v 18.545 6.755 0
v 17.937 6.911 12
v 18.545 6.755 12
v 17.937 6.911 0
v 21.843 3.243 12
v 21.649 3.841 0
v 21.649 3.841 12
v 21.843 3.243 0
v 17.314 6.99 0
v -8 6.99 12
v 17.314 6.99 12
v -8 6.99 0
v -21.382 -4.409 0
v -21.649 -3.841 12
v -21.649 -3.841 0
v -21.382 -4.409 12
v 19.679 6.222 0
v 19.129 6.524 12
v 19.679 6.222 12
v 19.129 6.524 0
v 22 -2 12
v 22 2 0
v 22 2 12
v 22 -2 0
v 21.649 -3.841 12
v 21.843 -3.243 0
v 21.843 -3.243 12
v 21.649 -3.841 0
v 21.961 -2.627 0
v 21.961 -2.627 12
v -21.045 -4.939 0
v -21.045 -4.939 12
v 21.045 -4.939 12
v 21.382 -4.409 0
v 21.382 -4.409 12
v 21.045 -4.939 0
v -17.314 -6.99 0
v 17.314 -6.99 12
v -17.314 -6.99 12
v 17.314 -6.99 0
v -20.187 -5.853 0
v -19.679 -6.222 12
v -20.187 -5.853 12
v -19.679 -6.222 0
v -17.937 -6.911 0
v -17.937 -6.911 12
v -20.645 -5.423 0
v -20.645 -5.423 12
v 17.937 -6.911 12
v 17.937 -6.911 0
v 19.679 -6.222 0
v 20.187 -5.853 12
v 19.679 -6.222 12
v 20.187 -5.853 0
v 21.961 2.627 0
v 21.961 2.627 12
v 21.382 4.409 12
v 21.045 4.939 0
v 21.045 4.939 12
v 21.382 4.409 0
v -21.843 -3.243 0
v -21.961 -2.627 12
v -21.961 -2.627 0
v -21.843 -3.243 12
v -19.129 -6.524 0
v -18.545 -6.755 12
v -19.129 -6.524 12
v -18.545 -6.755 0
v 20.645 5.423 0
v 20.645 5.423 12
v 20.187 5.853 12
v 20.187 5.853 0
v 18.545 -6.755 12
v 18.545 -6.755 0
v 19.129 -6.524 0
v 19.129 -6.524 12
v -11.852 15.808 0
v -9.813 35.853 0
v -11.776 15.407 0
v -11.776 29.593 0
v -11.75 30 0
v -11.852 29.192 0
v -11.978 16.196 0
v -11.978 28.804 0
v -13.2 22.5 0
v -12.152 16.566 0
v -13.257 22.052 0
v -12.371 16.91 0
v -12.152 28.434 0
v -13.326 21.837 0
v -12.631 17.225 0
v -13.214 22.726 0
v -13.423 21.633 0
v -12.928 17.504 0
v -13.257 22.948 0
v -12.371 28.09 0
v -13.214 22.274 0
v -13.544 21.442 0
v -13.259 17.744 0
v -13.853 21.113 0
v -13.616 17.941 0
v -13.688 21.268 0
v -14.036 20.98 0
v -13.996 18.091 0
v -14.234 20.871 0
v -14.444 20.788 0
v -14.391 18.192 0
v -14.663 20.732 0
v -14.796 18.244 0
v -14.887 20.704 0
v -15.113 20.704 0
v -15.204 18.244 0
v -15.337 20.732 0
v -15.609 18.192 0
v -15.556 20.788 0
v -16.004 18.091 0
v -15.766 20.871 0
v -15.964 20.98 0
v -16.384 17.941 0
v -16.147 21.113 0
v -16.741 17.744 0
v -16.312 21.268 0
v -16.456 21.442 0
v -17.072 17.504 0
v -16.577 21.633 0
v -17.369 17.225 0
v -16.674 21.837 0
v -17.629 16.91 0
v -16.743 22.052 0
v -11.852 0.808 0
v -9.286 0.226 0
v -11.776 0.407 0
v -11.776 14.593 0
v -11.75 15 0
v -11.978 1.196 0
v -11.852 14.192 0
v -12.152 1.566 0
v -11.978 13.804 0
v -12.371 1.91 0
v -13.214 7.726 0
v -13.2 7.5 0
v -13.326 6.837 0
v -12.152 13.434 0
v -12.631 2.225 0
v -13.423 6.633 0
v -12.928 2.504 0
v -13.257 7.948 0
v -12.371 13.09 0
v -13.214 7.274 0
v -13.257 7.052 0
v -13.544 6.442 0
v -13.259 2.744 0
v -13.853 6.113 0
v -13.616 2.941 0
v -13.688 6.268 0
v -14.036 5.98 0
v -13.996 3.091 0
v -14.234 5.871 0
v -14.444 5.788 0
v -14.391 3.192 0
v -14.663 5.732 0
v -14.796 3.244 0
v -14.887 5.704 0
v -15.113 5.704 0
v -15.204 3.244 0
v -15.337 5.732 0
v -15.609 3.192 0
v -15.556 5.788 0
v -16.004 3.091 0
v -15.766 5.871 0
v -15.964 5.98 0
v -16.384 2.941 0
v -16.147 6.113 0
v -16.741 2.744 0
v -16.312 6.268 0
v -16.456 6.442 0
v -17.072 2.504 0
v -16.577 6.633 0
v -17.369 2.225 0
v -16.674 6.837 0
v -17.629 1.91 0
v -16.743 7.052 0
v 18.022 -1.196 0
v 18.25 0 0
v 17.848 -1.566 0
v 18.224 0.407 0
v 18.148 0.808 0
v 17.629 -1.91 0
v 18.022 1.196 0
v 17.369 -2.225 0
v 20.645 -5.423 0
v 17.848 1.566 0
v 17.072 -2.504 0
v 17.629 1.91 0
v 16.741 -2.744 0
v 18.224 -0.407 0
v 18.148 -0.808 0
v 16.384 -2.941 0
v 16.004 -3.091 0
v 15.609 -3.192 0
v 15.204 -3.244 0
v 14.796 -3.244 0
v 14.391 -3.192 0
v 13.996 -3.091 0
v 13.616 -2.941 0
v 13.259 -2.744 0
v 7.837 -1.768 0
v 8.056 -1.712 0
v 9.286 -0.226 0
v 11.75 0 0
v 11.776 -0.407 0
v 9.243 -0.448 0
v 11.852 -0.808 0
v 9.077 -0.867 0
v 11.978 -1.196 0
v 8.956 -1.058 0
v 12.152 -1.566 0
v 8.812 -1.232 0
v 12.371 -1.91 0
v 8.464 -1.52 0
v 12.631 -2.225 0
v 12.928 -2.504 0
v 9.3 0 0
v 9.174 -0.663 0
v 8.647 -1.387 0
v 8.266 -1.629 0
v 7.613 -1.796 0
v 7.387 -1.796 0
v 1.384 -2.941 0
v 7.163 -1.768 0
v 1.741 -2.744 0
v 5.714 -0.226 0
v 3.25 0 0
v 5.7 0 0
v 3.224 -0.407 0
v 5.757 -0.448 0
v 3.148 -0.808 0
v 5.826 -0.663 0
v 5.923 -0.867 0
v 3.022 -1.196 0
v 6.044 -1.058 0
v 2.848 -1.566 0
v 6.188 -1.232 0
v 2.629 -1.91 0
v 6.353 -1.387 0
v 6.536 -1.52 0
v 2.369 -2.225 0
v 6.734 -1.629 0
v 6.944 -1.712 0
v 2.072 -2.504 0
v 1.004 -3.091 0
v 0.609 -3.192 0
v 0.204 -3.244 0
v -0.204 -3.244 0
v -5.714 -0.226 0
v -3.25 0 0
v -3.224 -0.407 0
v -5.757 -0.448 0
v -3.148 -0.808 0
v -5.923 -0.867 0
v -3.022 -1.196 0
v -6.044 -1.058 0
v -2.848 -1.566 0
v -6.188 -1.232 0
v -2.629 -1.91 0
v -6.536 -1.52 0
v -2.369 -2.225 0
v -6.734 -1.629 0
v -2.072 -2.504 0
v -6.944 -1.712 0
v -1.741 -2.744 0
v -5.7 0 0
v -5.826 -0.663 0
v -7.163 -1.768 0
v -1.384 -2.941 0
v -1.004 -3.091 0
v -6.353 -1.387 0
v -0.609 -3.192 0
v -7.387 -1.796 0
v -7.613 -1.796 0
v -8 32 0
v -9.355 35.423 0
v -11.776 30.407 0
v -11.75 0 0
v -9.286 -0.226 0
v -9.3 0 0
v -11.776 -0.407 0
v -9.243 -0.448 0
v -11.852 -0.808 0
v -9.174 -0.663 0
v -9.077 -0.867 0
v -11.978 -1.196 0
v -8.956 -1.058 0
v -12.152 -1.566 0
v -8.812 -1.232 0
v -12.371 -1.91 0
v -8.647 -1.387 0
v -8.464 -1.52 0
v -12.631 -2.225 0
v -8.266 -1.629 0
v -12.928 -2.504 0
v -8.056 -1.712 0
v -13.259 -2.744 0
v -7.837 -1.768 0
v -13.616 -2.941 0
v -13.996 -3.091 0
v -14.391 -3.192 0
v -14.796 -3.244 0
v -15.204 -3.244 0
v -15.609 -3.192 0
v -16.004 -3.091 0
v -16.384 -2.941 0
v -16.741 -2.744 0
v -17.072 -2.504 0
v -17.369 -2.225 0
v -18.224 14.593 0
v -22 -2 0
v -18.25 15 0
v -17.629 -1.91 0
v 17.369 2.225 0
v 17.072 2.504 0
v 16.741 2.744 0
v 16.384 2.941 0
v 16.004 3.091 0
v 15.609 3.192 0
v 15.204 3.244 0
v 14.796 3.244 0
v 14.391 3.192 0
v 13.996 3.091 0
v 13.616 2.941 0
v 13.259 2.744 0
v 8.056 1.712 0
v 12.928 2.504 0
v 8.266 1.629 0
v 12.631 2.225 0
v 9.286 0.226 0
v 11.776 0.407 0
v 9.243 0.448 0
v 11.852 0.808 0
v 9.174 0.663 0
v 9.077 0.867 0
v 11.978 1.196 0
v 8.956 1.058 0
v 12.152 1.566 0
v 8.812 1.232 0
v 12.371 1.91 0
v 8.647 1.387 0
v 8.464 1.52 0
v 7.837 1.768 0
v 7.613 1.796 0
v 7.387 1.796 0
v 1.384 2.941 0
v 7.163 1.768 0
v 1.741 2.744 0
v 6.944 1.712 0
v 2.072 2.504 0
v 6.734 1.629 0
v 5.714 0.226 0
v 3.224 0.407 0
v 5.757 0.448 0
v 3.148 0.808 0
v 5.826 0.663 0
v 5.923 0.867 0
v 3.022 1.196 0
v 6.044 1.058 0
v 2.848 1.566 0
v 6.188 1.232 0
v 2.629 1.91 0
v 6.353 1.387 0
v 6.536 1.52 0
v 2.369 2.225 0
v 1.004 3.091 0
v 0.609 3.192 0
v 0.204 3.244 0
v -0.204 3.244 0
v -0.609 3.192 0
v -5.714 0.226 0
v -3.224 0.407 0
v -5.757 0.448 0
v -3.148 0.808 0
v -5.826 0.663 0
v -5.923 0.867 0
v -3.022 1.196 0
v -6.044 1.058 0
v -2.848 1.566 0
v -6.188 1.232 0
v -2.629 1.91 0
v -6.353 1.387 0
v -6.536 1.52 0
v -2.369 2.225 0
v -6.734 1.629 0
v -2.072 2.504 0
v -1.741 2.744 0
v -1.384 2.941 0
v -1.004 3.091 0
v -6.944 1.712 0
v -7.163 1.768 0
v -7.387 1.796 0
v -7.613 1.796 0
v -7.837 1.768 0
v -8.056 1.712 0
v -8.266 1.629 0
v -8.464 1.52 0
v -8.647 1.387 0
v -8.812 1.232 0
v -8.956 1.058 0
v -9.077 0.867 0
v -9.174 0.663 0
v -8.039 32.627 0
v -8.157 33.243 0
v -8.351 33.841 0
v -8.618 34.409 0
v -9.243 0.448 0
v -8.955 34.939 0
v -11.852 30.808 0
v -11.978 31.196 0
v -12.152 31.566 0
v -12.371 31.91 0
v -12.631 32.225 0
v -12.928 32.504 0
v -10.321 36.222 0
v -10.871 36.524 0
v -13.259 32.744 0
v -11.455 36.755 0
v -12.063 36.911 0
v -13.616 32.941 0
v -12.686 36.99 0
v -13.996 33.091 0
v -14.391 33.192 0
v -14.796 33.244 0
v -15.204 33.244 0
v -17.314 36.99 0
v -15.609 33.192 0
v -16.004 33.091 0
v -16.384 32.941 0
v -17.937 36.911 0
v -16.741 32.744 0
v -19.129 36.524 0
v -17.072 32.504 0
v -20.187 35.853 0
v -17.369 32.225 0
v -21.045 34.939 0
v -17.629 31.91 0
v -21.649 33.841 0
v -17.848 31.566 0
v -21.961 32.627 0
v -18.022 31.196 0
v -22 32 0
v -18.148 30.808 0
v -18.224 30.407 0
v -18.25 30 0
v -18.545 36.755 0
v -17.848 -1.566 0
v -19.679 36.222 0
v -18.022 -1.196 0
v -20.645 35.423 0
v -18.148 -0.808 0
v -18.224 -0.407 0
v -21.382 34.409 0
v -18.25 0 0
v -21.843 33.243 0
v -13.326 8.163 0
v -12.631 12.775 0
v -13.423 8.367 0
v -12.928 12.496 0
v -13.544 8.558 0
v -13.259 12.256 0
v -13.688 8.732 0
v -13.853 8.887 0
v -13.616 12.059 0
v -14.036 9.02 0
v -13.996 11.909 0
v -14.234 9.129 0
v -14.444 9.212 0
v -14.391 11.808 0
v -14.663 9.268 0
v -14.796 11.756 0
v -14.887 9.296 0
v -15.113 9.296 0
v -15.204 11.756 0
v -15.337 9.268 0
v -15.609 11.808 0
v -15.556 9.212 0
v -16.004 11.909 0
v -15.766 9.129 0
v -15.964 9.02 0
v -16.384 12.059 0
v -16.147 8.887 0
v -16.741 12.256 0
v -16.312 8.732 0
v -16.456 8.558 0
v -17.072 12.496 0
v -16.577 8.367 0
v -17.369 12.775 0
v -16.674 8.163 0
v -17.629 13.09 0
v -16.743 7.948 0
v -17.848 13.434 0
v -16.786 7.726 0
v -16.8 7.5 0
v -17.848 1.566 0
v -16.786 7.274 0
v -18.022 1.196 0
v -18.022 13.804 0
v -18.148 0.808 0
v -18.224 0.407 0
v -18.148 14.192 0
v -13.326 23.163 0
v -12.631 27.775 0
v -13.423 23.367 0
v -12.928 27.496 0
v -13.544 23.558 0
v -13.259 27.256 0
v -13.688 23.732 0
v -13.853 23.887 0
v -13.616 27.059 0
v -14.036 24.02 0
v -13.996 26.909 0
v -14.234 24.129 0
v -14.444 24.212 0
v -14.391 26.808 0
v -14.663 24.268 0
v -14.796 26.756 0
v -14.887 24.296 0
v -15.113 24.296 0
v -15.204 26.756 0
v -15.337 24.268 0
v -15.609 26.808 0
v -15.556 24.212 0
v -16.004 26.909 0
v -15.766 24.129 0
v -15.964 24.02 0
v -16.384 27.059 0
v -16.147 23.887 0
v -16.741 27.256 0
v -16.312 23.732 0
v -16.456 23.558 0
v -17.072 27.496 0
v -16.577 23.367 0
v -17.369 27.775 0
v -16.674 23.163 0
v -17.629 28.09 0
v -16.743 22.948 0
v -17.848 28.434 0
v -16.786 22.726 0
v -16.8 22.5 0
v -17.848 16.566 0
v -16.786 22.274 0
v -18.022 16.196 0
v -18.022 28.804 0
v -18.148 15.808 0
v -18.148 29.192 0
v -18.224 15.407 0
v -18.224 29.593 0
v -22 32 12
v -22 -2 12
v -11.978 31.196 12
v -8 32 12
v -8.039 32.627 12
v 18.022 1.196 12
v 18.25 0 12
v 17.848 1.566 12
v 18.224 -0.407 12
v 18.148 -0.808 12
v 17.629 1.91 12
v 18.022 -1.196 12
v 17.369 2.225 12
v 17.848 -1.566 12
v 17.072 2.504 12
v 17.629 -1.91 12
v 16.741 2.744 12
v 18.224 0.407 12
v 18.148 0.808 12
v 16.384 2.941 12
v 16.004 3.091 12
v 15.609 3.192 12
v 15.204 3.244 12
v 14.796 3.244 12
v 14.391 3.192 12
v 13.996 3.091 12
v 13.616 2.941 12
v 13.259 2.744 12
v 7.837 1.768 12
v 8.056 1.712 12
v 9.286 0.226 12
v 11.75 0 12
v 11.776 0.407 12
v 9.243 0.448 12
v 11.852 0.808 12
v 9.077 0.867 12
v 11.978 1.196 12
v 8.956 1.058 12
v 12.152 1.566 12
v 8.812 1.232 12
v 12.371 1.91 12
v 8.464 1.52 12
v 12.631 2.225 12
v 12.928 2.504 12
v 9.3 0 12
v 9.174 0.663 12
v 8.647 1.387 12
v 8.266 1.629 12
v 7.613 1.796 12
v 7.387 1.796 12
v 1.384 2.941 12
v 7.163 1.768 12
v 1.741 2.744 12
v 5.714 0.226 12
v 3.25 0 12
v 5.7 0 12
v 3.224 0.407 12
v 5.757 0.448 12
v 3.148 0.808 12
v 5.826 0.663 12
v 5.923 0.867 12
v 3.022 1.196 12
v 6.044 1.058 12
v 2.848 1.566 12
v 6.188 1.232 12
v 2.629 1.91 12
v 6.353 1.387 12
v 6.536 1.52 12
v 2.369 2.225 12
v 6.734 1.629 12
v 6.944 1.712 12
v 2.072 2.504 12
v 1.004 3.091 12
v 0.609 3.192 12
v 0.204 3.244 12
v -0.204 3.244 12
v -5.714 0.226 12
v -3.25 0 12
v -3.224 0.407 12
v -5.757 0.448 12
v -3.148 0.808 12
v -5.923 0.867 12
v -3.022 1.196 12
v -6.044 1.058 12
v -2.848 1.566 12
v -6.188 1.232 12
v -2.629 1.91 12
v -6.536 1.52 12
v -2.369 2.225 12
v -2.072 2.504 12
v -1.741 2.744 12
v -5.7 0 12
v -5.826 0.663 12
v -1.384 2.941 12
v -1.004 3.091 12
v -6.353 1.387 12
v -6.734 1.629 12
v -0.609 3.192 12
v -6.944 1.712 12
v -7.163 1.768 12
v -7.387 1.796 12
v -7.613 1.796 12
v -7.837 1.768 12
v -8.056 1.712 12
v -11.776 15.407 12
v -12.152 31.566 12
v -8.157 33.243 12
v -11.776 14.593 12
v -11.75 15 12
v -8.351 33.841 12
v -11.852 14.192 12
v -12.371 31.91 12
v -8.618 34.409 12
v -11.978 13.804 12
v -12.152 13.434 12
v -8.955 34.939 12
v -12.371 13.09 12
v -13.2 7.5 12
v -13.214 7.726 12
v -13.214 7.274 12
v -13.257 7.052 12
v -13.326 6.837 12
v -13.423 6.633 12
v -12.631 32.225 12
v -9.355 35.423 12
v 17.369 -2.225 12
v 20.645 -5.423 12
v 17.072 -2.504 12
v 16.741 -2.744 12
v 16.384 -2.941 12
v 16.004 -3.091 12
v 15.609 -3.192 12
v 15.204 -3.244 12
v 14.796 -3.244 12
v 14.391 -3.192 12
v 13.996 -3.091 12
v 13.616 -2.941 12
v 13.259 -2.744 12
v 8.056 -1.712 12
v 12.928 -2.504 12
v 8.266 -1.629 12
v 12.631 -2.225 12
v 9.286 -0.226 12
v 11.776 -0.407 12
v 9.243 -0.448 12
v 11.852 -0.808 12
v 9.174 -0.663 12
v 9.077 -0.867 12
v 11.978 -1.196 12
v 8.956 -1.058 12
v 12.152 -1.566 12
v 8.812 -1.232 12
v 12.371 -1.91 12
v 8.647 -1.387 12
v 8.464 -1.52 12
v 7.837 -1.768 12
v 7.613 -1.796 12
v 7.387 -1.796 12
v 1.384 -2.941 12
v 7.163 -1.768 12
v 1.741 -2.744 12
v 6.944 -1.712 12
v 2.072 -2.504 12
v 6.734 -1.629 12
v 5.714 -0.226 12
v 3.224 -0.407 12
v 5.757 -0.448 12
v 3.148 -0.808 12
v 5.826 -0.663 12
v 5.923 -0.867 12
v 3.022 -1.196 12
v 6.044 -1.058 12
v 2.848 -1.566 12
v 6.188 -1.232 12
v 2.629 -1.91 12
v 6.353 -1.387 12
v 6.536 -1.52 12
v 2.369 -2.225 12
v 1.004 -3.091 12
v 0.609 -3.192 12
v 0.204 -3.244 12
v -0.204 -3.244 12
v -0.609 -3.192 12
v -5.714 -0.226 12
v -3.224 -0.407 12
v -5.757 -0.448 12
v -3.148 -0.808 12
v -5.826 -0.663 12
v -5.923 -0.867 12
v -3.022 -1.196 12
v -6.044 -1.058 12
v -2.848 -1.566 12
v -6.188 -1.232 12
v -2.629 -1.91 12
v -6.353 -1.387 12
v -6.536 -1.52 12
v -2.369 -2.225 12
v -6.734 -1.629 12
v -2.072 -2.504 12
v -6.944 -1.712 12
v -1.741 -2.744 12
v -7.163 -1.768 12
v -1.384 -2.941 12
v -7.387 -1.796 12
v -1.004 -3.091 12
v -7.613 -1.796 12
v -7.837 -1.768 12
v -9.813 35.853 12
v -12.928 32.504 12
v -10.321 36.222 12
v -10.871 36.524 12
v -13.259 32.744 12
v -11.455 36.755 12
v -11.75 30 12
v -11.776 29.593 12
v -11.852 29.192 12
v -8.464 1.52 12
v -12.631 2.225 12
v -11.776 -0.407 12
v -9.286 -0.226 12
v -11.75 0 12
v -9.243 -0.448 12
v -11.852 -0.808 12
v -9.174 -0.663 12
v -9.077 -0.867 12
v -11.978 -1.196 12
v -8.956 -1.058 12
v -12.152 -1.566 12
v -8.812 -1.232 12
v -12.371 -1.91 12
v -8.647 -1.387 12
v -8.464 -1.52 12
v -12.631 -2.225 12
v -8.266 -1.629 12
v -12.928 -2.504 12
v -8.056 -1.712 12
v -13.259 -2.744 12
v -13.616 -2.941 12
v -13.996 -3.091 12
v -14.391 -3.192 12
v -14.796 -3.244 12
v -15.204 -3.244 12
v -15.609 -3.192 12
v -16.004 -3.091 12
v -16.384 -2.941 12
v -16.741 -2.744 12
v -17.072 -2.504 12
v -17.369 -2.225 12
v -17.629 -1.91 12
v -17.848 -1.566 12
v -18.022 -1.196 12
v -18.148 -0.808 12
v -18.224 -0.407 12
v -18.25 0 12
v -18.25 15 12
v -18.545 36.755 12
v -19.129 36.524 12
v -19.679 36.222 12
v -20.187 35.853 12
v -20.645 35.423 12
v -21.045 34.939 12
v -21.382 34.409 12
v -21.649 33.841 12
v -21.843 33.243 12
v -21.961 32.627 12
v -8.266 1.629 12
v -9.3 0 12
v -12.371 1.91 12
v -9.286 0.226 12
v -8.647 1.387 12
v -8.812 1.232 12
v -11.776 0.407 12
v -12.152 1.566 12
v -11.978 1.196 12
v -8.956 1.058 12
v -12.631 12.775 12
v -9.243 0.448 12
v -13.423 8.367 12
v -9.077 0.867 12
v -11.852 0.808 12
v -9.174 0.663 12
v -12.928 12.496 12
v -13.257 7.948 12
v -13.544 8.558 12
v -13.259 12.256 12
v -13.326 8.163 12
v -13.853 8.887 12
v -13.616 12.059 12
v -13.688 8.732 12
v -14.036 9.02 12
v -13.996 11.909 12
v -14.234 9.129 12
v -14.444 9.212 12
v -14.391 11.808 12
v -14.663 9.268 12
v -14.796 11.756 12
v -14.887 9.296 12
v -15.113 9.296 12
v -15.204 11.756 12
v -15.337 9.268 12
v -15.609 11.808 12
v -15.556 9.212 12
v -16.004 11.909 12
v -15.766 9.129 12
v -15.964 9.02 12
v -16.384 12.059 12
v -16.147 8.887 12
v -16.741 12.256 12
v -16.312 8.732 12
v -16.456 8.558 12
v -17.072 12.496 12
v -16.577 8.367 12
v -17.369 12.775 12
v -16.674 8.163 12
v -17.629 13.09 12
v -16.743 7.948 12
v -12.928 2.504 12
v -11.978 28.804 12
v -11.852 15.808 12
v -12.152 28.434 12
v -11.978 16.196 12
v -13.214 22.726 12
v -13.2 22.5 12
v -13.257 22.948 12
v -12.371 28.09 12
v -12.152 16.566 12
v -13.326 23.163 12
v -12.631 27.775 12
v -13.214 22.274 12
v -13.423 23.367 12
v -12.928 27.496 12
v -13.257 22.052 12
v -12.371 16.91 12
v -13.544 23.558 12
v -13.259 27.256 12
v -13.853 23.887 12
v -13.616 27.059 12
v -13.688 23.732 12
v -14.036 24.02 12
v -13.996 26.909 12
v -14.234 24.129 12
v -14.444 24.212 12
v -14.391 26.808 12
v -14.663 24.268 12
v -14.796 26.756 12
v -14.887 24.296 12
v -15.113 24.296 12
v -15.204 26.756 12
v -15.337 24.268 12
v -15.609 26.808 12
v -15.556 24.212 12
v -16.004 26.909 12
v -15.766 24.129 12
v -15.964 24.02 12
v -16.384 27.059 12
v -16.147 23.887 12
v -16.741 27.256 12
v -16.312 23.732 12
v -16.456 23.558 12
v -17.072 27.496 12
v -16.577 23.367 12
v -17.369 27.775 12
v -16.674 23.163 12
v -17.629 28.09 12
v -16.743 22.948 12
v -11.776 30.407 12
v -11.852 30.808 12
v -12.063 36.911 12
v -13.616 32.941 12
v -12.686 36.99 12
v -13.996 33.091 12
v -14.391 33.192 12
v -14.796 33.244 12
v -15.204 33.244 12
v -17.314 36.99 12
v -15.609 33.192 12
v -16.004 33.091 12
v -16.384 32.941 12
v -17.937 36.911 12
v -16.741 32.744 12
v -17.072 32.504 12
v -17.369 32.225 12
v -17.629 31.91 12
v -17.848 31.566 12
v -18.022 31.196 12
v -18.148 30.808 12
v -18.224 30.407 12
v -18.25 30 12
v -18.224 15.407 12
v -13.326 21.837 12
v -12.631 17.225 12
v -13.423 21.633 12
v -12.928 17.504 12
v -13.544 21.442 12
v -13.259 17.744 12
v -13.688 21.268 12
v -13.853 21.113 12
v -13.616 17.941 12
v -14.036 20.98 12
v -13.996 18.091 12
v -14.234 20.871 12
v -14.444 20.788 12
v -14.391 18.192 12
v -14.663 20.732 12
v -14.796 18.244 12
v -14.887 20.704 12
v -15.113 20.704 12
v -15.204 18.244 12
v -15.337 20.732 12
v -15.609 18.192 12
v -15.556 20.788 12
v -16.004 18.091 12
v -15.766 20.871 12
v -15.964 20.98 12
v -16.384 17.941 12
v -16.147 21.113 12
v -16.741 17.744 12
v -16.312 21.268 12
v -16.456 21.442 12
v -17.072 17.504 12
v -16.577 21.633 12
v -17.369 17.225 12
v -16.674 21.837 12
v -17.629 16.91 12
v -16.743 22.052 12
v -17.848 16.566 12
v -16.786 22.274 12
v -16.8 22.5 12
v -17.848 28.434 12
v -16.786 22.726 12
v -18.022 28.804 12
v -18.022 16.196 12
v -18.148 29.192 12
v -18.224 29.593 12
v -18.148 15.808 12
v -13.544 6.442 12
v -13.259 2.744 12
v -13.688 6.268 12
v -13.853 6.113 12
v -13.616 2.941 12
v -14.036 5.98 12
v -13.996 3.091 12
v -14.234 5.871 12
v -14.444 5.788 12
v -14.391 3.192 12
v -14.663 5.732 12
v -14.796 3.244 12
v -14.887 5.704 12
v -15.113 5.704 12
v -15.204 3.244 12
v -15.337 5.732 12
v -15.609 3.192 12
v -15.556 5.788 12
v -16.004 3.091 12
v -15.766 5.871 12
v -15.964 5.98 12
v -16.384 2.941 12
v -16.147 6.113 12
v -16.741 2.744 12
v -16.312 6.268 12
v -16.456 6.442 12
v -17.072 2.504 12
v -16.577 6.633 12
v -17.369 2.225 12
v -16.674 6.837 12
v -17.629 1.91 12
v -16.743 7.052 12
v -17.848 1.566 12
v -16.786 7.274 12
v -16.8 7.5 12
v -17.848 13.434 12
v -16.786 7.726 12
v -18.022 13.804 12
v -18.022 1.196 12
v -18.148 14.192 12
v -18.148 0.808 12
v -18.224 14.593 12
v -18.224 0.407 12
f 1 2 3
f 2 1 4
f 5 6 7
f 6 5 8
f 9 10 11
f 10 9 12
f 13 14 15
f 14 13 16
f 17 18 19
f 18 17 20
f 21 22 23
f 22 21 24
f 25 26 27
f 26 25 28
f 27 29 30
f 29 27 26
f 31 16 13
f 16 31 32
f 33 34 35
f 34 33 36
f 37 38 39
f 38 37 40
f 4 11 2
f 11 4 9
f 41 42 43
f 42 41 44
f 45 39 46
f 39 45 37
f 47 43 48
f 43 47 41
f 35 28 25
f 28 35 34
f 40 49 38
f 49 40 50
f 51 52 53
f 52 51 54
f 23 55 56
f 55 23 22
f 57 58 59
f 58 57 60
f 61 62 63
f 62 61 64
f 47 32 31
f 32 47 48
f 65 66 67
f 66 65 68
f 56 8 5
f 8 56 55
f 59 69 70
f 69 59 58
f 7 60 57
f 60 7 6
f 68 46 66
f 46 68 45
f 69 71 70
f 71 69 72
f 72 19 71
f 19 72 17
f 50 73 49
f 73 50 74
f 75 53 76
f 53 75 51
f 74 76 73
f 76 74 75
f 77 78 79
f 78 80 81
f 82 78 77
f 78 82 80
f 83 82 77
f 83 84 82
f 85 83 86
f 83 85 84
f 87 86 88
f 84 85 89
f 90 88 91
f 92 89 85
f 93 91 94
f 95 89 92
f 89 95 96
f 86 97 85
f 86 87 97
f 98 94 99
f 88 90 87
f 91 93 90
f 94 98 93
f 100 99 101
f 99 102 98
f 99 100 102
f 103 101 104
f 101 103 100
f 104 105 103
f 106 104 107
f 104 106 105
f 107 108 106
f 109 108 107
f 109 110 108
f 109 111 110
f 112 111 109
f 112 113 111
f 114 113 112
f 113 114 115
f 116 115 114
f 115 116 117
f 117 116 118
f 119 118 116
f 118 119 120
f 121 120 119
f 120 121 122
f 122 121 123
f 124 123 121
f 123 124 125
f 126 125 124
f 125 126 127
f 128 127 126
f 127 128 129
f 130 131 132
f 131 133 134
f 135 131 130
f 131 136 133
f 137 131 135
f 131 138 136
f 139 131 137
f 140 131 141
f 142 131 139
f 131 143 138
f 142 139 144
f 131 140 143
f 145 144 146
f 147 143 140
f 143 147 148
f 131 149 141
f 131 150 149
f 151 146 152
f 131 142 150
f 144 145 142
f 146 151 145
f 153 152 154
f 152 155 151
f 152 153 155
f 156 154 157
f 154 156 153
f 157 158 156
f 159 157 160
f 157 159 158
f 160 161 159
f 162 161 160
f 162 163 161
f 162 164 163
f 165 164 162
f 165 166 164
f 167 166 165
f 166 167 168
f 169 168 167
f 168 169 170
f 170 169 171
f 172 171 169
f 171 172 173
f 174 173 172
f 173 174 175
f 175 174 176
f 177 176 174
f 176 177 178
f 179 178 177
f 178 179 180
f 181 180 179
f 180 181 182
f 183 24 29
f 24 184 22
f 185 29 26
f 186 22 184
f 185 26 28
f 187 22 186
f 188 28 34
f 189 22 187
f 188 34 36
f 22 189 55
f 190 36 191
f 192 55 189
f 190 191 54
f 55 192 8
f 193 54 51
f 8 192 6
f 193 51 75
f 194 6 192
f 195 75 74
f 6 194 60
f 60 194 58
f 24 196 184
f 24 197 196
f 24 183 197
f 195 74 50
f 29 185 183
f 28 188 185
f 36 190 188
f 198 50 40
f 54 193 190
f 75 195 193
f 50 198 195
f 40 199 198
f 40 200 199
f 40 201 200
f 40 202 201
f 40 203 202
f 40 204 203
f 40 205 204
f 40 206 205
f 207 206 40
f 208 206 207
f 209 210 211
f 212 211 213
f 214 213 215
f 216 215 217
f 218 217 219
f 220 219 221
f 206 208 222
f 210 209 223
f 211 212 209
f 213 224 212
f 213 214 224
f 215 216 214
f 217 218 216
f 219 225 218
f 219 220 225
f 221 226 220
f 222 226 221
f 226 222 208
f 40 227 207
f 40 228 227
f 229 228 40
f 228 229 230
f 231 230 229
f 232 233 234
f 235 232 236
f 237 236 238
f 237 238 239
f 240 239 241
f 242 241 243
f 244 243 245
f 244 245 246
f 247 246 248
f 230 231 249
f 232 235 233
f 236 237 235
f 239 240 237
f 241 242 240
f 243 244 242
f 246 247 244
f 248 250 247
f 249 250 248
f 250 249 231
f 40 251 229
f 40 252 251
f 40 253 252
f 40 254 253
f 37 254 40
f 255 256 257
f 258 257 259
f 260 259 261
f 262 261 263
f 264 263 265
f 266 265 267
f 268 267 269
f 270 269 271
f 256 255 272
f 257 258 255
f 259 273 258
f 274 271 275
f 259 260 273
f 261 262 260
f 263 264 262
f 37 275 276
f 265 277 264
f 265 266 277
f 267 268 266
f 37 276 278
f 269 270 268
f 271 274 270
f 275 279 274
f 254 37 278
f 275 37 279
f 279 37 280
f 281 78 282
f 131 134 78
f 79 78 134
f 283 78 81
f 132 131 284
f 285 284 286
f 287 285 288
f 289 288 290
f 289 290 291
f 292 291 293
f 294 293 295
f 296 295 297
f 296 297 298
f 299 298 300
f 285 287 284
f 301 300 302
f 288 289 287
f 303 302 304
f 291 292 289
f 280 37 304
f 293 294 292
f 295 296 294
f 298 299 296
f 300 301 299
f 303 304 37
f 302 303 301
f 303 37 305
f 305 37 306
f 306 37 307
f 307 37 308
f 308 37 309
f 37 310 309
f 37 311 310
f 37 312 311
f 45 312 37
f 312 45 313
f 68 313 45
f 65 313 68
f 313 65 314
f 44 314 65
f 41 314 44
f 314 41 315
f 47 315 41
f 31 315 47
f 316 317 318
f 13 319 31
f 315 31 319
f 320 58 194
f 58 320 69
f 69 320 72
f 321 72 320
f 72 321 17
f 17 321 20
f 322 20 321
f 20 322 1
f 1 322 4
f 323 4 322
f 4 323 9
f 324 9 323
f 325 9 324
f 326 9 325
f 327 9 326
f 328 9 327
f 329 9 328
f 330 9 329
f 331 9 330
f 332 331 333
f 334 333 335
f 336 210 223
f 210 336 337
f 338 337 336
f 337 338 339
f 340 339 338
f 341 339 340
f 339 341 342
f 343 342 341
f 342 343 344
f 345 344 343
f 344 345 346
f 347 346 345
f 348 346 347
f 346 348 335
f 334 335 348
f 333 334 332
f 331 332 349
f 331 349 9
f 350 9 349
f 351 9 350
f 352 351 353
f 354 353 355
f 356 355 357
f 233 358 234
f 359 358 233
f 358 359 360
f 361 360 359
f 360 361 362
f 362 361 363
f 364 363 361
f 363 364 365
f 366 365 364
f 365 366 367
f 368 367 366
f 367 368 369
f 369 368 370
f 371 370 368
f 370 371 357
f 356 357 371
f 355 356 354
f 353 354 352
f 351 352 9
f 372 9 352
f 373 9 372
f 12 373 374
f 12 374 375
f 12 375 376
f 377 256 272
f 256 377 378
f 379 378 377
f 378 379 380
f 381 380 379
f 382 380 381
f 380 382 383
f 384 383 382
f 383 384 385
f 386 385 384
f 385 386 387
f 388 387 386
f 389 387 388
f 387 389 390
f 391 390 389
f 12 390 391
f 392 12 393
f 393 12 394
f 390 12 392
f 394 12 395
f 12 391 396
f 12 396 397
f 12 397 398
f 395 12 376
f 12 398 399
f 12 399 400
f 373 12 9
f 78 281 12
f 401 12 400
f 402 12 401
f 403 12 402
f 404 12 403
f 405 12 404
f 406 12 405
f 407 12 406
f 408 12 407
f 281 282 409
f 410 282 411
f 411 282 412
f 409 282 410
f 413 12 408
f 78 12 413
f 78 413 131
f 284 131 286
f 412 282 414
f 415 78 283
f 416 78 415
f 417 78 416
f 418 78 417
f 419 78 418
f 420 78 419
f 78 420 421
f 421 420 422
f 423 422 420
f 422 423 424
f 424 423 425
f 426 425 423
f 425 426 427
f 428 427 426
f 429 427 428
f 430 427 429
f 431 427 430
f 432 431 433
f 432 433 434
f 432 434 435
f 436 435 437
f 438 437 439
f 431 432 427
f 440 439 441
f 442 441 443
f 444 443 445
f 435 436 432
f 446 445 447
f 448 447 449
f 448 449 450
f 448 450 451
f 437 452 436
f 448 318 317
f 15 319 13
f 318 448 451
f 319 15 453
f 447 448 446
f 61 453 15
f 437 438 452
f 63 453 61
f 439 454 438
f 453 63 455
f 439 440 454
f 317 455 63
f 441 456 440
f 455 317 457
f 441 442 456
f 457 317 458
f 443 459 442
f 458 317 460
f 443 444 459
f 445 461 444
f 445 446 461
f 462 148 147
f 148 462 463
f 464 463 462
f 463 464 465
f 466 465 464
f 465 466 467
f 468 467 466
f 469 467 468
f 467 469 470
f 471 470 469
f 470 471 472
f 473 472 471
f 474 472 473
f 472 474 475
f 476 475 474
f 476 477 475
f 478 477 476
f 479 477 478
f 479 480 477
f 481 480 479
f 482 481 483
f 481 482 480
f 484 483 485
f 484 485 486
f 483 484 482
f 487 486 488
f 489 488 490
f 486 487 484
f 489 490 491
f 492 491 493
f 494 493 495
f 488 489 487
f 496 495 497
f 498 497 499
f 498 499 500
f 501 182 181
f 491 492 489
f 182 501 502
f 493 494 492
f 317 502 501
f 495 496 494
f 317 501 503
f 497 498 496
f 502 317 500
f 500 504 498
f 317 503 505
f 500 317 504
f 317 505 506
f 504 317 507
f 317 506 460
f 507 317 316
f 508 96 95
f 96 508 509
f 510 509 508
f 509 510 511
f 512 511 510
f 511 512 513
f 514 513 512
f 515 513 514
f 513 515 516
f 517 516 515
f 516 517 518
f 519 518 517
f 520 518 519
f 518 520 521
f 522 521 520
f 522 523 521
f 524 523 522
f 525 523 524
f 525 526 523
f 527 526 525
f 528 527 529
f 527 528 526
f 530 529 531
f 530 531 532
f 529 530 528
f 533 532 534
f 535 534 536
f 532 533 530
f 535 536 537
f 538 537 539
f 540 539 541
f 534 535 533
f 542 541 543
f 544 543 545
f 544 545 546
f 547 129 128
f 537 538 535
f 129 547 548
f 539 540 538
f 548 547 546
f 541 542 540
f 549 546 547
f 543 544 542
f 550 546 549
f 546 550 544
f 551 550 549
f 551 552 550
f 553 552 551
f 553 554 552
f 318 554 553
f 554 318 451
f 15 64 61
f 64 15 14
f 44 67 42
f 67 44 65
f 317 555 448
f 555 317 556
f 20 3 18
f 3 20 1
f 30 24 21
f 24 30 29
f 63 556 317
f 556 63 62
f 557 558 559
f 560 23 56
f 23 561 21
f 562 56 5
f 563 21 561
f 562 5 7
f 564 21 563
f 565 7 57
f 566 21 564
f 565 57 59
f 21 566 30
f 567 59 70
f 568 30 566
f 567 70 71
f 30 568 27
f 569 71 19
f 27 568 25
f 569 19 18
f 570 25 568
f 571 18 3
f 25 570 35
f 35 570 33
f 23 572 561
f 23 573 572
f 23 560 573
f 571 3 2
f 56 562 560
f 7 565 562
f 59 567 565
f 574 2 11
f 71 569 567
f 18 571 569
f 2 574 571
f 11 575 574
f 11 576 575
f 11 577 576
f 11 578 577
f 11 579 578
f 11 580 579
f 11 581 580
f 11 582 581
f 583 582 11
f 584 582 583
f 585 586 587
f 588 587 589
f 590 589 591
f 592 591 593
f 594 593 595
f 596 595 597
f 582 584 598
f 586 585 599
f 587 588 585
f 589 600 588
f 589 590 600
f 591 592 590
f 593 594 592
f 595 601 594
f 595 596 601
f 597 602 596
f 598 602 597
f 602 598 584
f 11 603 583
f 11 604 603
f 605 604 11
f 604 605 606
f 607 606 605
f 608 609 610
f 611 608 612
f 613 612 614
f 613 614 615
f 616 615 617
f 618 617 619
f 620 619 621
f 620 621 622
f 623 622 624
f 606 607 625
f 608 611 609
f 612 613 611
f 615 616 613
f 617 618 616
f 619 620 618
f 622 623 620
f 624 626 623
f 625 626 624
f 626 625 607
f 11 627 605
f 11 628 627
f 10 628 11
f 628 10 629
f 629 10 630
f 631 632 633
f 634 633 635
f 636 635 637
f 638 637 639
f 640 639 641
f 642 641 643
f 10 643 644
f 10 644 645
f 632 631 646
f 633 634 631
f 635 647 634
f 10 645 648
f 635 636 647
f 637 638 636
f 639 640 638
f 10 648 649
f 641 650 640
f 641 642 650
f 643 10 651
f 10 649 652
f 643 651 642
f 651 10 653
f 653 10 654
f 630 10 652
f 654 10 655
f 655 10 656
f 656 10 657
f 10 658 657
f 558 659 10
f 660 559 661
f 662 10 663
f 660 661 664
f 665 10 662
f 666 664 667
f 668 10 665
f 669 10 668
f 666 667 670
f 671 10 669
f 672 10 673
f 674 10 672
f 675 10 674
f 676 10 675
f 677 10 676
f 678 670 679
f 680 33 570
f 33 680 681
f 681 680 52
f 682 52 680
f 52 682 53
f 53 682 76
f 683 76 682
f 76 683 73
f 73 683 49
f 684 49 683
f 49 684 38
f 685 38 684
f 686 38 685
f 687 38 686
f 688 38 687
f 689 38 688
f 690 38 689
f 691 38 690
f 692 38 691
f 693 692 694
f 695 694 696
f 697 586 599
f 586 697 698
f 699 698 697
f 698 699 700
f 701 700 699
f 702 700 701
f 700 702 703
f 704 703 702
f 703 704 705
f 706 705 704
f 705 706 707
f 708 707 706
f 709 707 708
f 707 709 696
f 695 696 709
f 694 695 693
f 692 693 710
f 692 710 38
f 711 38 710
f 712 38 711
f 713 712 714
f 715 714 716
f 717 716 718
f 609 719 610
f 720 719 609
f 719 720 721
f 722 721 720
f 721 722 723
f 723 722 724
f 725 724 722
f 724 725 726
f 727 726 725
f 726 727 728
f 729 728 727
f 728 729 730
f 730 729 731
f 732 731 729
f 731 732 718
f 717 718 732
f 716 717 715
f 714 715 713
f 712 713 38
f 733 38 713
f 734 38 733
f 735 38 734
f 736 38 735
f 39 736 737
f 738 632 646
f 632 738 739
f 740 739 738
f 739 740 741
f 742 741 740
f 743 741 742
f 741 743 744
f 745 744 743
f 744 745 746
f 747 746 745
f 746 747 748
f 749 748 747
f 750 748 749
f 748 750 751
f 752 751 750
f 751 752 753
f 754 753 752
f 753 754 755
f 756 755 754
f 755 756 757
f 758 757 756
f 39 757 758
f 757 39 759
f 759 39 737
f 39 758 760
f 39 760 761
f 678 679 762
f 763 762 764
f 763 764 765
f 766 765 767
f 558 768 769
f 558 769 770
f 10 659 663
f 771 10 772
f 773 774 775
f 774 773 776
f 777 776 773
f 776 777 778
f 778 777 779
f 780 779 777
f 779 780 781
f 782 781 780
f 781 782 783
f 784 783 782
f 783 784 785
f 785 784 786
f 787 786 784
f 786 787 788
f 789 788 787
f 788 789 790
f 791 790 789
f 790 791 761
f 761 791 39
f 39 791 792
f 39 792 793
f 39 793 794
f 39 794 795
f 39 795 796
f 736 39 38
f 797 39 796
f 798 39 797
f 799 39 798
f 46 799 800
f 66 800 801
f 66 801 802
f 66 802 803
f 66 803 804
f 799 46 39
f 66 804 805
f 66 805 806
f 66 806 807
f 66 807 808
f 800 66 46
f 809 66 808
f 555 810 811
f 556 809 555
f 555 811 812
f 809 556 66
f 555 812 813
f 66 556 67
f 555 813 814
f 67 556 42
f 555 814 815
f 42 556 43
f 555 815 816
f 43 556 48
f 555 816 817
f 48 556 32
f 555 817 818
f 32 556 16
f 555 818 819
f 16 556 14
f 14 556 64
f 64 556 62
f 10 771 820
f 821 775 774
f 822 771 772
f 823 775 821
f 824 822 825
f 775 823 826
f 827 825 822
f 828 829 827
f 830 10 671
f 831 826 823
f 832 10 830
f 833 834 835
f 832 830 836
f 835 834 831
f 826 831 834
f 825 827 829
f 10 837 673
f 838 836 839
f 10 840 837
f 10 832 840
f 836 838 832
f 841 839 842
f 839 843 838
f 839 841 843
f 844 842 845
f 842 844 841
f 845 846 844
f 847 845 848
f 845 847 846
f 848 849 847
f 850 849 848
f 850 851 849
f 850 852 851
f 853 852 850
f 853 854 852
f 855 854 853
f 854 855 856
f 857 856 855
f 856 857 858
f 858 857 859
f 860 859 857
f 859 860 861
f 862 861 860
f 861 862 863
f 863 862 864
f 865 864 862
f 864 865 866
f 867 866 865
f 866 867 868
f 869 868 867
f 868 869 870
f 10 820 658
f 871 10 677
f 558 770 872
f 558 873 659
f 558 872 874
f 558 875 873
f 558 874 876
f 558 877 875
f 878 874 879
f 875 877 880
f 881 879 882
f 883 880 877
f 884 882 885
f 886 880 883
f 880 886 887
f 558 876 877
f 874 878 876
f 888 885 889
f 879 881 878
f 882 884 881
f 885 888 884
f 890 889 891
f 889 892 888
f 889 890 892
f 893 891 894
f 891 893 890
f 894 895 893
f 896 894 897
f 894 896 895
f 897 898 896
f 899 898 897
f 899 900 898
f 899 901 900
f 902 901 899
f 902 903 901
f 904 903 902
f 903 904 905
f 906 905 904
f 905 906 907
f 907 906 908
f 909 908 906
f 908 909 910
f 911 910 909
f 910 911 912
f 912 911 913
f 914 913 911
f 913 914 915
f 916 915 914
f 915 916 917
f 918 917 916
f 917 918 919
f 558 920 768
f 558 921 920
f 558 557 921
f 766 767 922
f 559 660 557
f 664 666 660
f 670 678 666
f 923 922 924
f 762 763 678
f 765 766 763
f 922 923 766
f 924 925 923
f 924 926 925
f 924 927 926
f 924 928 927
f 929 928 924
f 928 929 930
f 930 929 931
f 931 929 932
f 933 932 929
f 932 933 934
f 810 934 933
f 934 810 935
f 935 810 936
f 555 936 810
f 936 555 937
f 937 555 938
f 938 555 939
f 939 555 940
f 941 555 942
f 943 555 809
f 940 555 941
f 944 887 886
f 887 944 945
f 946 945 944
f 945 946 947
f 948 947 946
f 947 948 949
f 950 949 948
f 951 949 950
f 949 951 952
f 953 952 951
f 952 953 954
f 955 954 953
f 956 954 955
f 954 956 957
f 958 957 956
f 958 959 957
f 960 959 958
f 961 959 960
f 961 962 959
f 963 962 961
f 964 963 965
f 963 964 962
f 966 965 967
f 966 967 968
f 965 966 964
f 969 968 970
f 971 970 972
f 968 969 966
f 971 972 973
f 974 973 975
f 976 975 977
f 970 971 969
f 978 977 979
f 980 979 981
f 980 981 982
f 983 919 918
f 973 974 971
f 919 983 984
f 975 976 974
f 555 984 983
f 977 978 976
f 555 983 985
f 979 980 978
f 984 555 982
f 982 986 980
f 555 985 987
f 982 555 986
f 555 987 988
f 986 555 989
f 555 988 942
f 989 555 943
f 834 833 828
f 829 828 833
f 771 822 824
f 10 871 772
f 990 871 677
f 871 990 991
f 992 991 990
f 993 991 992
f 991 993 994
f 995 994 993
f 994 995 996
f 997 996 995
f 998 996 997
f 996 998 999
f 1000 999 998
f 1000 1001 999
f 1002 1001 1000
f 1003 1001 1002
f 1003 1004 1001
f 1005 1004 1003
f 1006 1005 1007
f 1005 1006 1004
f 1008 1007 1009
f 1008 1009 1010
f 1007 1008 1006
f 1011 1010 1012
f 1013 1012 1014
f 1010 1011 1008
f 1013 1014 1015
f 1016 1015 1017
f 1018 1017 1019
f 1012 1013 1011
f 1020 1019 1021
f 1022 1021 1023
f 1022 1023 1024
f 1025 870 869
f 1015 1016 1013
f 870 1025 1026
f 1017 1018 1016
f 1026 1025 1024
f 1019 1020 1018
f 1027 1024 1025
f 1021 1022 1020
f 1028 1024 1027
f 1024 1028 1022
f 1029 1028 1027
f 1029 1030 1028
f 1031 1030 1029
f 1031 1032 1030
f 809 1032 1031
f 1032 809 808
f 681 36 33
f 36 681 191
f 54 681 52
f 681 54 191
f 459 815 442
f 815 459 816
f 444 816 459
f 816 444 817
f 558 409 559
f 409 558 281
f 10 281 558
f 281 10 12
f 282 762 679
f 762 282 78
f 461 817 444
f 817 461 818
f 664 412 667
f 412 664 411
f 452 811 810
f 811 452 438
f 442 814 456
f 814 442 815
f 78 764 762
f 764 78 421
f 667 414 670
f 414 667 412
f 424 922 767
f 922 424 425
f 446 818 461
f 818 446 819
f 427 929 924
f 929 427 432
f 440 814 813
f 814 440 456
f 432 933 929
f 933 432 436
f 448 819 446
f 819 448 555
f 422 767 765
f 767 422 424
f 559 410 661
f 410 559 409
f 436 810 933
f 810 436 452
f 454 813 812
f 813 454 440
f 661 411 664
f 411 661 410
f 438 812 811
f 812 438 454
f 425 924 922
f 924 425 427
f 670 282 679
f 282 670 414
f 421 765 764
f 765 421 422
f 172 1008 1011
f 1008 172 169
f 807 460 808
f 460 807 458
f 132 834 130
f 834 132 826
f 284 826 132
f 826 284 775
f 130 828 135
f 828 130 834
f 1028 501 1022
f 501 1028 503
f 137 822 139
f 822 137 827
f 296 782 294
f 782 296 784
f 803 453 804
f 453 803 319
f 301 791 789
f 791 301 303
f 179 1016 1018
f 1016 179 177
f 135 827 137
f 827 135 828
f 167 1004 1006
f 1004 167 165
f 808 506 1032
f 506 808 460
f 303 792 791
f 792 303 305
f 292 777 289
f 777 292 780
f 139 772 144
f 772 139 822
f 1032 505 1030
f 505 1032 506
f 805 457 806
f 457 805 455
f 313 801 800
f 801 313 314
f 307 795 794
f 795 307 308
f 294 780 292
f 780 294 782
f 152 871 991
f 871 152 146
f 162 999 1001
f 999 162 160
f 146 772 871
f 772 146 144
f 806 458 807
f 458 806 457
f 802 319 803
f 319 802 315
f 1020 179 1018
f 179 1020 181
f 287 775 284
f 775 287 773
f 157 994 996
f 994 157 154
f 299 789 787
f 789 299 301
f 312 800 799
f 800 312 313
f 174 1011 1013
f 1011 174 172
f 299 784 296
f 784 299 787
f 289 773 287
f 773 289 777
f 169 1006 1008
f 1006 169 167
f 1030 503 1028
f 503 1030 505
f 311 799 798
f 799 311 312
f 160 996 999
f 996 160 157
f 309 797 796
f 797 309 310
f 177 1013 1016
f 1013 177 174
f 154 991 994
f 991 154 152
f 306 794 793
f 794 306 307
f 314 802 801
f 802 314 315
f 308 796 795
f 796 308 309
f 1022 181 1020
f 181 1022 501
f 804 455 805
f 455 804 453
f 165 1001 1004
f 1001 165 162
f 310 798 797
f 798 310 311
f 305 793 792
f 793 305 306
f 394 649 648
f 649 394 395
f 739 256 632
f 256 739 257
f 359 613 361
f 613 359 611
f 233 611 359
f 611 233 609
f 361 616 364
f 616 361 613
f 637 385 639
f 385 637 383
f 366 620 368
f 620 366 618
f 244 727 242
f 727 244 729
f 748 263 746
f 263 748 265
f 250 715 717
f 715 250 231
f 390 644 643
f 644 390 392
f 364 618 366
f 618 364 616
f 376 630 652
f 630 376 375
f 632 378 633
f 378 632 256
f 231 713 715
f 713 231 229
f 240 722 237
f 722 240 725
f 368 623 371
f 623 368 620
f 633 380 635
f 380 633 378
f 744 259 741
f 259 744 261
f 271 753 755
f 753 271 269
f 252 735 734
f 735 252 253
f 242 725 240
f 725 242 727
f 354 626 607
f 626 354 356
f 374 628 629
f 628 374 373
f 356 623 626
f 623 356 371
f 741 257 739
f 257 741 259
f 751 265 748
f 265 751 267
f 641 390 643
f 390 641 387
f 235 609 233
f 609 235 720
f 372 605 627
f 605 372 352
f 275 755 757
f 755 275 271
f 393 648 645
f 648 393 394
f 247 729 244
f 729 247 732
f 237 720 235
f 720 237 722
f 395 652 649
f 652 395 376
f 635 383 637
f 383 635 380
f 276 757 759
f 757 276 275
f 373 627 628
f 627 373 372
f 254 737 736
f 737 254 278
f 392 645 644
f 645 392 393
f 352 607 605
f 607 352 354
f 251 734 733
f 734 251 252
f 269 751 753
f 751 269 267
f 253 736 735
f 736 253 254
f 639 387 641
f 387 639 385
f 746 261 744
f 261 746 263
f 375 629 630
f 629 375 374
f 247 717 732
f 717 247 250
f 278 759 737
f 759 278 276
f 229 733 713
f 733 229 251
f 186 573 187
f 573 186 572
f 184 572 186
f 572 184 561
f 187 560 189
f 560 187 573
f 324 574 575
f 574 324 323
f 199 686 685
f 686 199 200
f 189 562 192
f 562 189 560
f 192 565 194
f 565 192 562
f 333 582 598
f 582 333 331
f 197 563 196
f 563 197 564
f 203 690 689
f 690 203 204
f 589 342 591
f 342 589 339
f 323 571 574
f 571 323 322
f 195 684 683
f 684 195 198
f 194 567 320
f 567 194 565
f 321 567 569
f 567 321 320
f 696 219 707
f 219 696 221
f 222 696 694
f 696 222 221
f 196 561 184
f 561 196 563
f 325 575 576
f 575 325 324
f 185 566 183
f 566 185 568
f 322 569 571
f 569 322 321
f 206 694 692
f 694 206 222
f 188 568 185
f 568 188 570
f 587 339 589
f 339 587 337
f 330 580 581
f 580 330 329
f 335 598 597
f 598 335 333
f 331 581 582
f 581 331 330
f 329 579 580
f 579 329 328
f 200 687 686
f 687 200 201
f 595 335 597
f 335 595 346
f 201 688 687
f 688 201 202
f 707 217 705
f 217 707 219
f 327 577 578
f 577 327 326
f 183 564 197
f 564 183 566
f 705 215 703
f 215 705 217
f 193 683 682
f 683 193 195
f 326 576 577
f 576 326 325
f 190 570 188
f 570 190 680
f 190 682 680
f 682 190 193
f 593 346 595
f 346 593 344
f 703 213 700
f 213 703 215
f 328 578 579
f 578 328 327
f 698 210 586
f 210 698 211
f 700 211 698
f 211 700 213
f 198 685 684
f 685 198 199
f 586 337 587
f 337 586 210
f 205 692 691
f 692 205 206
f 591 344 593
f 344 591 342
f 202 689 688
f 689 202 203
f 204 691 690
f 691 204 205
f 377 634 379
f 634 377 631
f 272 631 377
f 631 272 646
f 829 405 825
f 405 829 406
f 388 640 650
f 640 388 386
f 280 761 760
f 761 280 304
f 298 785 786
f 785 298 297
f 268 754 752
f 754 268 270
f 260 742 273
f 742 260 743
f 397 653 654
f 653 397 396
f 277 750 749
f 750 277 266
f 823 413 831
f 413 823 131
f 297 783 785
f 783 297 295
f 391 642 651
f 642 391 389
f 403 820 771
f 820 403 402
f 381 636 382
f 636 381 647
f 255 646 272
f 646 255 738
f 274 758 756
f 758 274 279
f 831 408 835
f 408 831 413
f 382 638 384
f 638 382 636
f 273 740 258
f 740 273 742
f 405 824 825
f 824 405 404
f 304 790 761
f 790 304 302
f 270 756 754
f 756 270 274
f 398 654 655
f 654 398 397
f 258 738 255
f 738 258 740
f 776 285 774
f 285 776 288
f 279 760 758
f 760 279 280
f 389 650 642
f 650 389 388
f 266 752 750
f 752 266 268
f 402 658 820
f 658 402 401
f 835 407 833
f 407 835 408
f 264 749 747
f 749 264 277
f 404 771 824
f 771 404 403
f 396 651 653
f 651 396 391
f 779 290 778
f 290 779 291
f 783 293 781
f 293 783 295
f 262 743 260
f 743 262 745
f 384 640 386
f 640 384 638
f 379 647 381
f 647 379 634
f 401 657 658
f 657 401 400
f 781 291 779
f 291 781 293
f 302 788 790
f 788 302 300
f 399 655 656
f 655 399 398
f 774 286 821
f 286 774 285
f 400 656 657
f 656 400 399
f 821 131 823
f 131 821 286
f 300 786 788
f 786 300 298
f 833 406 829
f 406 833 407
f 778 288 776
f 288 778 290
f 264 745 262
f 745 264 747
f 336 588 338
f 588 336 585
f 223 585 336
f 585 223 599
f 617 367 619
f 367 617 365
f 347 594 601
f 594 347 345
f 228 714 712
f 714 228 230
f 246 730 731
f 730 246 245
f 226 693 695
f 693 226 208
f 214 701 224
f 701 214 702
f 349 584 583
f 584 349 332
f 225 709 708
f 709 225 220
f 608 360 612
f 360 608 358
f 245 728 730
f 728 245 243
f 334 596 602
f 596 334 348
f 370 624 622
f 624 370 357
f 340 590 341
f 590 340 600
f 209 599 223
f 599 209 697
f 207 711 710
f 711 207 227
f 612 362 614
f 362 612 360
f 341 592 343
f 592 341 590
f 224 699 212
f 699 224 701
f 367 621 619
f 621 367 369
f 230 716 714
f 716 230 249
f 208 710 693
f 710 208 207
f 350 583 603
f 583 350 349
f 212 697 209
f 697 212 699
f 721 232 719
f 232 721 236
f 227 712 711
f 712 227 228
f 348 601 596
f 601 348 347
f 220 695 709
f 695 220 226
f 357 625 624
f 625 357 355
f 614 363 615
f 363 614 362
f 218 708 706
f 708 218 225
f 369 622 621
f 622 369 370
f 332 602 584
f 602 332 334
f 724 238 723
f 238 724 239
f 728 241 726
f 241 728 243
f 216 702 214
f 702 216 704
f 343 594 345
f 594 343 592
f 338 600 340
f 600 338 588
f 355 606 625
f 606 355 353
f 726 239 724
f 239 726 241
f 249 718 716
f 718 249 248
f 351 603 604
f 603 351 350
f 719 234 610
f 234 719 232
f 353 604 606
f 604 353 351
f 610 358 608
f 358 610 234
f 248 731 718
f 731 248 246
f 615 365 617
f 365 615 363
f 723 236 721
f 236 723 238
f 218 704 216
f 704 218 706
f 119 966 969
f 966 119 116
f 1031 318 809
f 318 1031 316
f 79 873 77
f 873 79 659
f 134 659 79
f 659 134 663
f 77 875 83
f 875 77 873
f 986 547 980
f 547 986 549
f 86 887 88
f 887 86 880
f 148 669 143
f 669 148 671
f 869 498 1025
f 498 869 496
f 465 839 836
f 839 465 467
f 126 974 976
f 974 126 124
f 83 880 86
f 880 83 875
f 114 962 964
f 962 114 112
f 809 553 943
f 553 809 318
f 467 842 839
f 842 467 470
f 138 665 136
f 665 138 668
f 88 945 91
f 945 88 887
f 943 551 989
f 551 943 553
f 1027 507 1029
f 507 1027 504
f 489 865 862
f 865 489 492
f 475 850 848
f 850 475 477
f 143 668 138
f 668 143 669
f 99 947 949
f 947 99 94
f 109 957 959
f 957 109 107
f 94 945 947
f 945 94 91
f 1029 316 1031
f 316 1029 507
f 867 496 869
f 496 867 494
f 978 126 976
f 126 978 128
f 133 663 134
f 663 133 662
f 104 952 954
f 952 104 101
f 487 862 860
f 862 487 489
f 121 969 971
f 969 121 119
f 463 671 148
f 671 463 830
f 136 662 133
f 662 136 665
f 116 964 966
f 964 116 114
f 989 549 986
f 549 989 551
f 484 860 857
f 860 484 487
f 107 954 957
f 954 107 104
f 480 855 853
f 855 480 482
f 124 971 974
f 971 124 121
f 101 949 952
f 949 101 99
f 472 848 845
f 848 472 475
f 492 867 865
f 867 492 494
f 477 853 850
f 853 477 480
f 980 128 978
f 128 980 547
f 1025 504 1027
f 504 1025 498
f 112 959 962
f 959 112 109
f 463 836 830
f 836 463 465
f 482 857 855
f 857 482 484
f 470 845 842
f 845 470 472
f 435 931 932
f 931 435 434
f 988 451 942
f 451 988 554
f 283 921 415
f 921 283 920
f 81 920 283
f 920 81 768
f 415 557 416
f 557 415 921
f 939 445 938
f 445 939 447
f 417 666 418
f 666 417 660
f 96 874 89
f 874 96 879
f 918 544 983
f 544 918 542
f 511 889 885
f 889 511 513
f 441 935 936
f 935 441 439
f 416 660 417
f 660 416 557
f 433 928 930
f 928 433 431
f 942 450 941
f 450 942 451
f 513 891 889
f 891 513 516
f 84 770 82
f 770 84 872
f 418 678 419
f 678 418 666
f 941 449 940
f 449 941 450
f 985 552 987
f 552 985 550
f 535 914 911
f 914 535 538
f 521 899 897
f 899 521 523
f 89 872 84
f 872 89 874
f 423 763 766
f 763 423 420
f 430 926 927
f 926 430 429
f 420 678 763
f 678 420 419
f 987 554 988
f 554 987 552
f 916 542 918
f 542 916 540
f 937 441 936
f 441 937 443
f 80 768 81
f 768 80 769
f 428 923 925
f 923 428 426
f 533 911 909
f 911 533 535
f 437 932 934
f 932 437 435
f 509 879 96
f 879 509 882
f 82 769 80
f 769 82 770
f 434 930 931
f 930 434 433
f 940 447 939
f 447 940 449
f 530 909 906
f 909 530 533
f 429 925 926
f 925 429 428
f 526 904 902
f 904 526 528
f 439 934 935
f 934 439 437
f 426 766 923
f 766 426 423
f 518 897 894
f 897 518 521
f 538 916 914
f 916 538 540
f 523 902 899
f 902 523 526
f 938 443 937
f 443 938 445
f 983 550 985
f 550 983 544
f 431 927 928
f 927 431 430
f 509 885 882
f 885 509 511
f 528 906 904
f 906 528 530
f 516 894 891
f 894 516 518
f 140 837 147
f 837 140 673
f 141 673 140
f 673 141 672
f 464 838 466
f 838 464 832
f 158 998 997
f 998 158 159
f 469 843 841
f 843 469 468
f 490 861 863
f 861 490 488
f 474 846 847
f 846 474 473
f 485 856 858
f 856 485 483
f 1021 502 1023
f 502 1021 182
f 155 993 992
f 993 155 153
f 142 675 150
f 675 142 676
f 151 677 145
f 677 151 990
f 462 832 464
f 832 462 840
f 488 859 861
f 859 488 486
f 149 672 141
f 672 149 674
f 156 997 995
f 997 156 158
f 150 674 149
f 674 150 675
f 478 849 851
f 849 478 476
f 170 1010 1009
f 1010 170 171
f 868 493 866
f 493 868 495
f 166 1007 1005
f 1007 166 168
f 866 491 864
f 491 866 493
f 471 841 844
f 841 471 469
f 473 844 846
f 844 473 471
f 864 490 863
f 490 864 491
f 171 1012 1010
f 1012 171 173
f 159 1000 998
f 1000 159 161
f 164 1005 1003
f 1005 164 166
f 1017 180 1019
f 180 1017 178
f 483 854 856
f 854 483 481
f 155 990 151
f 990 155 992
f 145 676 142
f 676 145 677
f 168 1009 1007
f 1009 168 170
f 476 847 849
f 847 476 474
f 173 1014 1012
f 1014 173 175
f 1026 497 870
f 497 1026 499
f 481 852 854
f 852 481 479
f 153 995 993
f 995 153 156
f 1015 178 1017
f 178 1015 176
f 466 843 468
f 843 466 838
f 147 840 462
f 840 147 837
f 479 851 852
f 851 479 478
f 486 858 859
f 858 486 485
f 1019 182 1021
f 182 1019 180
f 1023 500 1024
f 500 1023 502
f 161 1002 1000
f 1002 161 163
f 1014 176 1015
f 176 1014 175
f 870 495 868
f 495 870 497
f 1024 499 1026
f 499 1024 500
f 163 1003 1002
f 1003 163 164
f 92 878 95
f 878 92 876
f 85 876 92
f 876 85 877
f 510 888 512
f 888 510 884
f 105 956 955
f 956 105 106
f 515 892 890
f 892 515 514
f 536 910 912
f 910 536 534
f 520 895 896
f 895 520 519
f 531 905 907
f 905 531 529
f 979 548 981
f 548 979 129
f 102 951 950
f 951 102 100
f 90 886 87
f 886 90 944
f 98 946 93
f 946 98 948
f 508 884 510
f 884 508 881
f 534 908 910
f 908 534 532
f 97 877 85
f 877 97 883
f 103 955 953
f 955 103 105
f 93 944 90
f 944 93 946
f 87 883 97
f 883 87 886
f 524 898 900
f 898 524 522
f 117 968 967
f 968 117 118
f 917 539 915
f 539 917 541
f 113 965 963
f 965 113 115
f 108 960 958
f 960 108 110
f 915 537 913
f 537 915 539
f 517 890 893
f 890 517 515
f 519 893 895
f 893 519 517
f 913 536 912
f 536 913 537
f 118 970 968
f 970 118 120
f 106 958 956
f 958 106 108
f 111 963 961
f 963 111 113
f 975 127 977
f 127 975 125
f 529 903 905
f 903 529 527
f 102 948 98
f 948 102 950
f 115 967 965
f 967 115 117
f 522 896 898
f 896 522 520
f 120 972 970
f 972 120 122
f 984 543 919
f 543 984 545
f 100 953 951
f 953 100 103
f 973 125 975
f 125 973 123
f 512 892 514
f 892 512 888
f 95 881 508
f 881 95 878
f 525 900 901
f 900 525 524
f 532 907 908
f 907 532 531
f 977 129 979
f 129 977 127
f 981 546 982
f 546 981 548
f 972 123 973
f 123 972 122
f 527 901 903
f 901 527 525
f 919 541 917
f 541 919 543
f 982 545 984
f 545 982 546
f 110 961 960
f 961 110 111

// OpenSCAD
$fn = 50;


difference() {
	union() {
		*color(alpha = 1.0000000000, c = "gray") {
			translate(v = [0, 7, 0]) {
				linear_extrude(height = 1) {
					text(font = "Arial:style=Bold", halign = "center", size = 4.5000000000, text = "COMMENT plate main", valign = "center");
				}
			}
		}
		hull() {
			translate(v = [-17.0000000000, 2.0000000000, 0]) {
				cylinder(h = 12, r = 5);
			}
			translate(v = [17.0000000000, 2.0000000000, 0]) {
				cylinder(h = 12, r = 5);
			}
			translate(v = [-17.0000000000, -2.0000000000, 0]) {
				cylinder(h = 12, r = 5);
			}
			translate(v = [17.0000000000, -2.0000000000, 0]) {
				cylinder(h = 12, r = 5);
			}
		}
		*color(alpha = 1.0000000000, c = "gray") {
			translate(v = [0, 7, 0]) {
				linear_extrude(height = 1) {
					text(font = "Arial:style=Bold", halign = "center", size = 4.5000000000, text = "COMMENT plate main", valign = "center");
				}
			}
		}
		translate(v = [-15.0000000000, 15.0000000000, 0]) {
			hull() {
				translate(v = [-2.0000000000, 17.0000000000, 0]) {
					cylinder(h = 12, r = 5);
				}
				translate(v = [2.0000000000, 17.0000000000, 0]) {
					cylinder(h = 12, r = 5);
				}
				translate(v = [-2.0000000000, -17.0000000000, 0]) {
					cylinder(h = 12, r = 5);
				}
				translate(v = [2.0000000000, -17.0000000000, 0]) {
					cylinder(h = 12, r = 5);
				}
			}
		}
	}
	union() {
		*color(alpha = 1.0000000000, c = "gray") {
			translate(v = [0, 7, 0]) {
				linear_extrude(height = 1) {
					text(font = "Arial:style=Bold", halign = "center", size = 4.5000000000, text = "COMMENT holes main", valign = "center");
				}
			}
		}
		translate(v = [-15.0000000000, 0.0000000000, 0]) {
			translate(v = [0, 0, -100]) {
				cylinder(h = 200, r = 3.2500000000);
			}
		}
		translate(v = [0, 0, -100]) {
			cylinder(h = 200, r = 3.2500000000);
		}
		translate(v = [15.0000000000, 0.0000000000, 0]) {
			translate(v = [0, 0, -100]) {
				cylinder(h = 200, r = 3.2500000000);
			}
		}
		translate(v = [-15.0000000000, 0.0000000000, 0]) {
			translate(v = [0, 0, -100]) {
				cylinder(h = 200, r = 1.8000000000);
			}
		}
		translate(v = [-7.5000000000, 0.0000000000, 0]) {
			translate(v = [0, 0, -100]) {
				cylinder(h = 200, r = 1.8000000000);
			}
		}
		translate(v = [0, 0, -100]) {
			cylinder(h = 200, r = 1.8000000000);
		}
		translate(v = [7.5000000000, 0.0000000000, 0]) {
			translate(v = [0, 0, -100]) {
				cylinder(h = 200, r = 1.8000000000);
			}
		}
		translate(v = [15.0000000000, 0.0000000000, 0]) {
			translate(v = [0, 0, -100]) {
				cylinder(h = 200, r = 1.8000000000);
			}
		}
		*color(alpha = 1.0000000000, c = "gray") {
			translate(v = [0, 7, 0]) {
				linear_extrude(height = 1) {
					text(font = "Arial:style=Bold", halign = "center", size = 4.5000000000, text = "COMMENT holes main", valign = "center");
				}
			}
		}
		translate(v = [-15.0000000000, 0.0000000000, 0]) {
			translate(v = [0, 0, -100]) {
				cylinder(h = 200, r = 3.2500000000);
			}
		}
		translate(v = [-15.0000000000, 15.0000000000, 0]) {
			translate(v = [0, 0, -100]) {
				cylinder(h = 200, r = 3.2500000000);
			}
		}
		translate(v = [-15.0000000000, 30.0000000000, 0]) {
			translate(v = [0, 0, -100]) {
				cylinder(h = 200, r = 3.2500000000);
			}
		}
		translate(v = [-15.0000000000, 0.0000000000, 0]) {
			translate(v = [0, 0, -100]) {
				cylinder(h = 200, r = 1.8000000000);
			}
		}
		translate(v = [-15.0000000000, 7.5000000000, 0]) {
			translate(v = [0, 0, -100]) {
				cylinder(h = 200, r = 1.8000000000);
			}
		}
		translate(v = [-15.0000000000, 15.0000000000, 0]) {
			translate(v = [0, 0, -100]) {
				cylinder(h = 200, r = 1.8000000000);
			}
		}
		translate(v = [-15.0000000000, 22.5000000000, 0]) {
			translate(v = [0, 0, -100]) {
				cylinder(h = 200, r = 1.8000000000);
			}
		}
		translate(v = [-15.0000000000, 30.0000000000, 0]) {
			translate(v = [0, 0, -100]) {
				cylinder(h = 200, r = 1.8000000000);
			}
		}
	}
}
